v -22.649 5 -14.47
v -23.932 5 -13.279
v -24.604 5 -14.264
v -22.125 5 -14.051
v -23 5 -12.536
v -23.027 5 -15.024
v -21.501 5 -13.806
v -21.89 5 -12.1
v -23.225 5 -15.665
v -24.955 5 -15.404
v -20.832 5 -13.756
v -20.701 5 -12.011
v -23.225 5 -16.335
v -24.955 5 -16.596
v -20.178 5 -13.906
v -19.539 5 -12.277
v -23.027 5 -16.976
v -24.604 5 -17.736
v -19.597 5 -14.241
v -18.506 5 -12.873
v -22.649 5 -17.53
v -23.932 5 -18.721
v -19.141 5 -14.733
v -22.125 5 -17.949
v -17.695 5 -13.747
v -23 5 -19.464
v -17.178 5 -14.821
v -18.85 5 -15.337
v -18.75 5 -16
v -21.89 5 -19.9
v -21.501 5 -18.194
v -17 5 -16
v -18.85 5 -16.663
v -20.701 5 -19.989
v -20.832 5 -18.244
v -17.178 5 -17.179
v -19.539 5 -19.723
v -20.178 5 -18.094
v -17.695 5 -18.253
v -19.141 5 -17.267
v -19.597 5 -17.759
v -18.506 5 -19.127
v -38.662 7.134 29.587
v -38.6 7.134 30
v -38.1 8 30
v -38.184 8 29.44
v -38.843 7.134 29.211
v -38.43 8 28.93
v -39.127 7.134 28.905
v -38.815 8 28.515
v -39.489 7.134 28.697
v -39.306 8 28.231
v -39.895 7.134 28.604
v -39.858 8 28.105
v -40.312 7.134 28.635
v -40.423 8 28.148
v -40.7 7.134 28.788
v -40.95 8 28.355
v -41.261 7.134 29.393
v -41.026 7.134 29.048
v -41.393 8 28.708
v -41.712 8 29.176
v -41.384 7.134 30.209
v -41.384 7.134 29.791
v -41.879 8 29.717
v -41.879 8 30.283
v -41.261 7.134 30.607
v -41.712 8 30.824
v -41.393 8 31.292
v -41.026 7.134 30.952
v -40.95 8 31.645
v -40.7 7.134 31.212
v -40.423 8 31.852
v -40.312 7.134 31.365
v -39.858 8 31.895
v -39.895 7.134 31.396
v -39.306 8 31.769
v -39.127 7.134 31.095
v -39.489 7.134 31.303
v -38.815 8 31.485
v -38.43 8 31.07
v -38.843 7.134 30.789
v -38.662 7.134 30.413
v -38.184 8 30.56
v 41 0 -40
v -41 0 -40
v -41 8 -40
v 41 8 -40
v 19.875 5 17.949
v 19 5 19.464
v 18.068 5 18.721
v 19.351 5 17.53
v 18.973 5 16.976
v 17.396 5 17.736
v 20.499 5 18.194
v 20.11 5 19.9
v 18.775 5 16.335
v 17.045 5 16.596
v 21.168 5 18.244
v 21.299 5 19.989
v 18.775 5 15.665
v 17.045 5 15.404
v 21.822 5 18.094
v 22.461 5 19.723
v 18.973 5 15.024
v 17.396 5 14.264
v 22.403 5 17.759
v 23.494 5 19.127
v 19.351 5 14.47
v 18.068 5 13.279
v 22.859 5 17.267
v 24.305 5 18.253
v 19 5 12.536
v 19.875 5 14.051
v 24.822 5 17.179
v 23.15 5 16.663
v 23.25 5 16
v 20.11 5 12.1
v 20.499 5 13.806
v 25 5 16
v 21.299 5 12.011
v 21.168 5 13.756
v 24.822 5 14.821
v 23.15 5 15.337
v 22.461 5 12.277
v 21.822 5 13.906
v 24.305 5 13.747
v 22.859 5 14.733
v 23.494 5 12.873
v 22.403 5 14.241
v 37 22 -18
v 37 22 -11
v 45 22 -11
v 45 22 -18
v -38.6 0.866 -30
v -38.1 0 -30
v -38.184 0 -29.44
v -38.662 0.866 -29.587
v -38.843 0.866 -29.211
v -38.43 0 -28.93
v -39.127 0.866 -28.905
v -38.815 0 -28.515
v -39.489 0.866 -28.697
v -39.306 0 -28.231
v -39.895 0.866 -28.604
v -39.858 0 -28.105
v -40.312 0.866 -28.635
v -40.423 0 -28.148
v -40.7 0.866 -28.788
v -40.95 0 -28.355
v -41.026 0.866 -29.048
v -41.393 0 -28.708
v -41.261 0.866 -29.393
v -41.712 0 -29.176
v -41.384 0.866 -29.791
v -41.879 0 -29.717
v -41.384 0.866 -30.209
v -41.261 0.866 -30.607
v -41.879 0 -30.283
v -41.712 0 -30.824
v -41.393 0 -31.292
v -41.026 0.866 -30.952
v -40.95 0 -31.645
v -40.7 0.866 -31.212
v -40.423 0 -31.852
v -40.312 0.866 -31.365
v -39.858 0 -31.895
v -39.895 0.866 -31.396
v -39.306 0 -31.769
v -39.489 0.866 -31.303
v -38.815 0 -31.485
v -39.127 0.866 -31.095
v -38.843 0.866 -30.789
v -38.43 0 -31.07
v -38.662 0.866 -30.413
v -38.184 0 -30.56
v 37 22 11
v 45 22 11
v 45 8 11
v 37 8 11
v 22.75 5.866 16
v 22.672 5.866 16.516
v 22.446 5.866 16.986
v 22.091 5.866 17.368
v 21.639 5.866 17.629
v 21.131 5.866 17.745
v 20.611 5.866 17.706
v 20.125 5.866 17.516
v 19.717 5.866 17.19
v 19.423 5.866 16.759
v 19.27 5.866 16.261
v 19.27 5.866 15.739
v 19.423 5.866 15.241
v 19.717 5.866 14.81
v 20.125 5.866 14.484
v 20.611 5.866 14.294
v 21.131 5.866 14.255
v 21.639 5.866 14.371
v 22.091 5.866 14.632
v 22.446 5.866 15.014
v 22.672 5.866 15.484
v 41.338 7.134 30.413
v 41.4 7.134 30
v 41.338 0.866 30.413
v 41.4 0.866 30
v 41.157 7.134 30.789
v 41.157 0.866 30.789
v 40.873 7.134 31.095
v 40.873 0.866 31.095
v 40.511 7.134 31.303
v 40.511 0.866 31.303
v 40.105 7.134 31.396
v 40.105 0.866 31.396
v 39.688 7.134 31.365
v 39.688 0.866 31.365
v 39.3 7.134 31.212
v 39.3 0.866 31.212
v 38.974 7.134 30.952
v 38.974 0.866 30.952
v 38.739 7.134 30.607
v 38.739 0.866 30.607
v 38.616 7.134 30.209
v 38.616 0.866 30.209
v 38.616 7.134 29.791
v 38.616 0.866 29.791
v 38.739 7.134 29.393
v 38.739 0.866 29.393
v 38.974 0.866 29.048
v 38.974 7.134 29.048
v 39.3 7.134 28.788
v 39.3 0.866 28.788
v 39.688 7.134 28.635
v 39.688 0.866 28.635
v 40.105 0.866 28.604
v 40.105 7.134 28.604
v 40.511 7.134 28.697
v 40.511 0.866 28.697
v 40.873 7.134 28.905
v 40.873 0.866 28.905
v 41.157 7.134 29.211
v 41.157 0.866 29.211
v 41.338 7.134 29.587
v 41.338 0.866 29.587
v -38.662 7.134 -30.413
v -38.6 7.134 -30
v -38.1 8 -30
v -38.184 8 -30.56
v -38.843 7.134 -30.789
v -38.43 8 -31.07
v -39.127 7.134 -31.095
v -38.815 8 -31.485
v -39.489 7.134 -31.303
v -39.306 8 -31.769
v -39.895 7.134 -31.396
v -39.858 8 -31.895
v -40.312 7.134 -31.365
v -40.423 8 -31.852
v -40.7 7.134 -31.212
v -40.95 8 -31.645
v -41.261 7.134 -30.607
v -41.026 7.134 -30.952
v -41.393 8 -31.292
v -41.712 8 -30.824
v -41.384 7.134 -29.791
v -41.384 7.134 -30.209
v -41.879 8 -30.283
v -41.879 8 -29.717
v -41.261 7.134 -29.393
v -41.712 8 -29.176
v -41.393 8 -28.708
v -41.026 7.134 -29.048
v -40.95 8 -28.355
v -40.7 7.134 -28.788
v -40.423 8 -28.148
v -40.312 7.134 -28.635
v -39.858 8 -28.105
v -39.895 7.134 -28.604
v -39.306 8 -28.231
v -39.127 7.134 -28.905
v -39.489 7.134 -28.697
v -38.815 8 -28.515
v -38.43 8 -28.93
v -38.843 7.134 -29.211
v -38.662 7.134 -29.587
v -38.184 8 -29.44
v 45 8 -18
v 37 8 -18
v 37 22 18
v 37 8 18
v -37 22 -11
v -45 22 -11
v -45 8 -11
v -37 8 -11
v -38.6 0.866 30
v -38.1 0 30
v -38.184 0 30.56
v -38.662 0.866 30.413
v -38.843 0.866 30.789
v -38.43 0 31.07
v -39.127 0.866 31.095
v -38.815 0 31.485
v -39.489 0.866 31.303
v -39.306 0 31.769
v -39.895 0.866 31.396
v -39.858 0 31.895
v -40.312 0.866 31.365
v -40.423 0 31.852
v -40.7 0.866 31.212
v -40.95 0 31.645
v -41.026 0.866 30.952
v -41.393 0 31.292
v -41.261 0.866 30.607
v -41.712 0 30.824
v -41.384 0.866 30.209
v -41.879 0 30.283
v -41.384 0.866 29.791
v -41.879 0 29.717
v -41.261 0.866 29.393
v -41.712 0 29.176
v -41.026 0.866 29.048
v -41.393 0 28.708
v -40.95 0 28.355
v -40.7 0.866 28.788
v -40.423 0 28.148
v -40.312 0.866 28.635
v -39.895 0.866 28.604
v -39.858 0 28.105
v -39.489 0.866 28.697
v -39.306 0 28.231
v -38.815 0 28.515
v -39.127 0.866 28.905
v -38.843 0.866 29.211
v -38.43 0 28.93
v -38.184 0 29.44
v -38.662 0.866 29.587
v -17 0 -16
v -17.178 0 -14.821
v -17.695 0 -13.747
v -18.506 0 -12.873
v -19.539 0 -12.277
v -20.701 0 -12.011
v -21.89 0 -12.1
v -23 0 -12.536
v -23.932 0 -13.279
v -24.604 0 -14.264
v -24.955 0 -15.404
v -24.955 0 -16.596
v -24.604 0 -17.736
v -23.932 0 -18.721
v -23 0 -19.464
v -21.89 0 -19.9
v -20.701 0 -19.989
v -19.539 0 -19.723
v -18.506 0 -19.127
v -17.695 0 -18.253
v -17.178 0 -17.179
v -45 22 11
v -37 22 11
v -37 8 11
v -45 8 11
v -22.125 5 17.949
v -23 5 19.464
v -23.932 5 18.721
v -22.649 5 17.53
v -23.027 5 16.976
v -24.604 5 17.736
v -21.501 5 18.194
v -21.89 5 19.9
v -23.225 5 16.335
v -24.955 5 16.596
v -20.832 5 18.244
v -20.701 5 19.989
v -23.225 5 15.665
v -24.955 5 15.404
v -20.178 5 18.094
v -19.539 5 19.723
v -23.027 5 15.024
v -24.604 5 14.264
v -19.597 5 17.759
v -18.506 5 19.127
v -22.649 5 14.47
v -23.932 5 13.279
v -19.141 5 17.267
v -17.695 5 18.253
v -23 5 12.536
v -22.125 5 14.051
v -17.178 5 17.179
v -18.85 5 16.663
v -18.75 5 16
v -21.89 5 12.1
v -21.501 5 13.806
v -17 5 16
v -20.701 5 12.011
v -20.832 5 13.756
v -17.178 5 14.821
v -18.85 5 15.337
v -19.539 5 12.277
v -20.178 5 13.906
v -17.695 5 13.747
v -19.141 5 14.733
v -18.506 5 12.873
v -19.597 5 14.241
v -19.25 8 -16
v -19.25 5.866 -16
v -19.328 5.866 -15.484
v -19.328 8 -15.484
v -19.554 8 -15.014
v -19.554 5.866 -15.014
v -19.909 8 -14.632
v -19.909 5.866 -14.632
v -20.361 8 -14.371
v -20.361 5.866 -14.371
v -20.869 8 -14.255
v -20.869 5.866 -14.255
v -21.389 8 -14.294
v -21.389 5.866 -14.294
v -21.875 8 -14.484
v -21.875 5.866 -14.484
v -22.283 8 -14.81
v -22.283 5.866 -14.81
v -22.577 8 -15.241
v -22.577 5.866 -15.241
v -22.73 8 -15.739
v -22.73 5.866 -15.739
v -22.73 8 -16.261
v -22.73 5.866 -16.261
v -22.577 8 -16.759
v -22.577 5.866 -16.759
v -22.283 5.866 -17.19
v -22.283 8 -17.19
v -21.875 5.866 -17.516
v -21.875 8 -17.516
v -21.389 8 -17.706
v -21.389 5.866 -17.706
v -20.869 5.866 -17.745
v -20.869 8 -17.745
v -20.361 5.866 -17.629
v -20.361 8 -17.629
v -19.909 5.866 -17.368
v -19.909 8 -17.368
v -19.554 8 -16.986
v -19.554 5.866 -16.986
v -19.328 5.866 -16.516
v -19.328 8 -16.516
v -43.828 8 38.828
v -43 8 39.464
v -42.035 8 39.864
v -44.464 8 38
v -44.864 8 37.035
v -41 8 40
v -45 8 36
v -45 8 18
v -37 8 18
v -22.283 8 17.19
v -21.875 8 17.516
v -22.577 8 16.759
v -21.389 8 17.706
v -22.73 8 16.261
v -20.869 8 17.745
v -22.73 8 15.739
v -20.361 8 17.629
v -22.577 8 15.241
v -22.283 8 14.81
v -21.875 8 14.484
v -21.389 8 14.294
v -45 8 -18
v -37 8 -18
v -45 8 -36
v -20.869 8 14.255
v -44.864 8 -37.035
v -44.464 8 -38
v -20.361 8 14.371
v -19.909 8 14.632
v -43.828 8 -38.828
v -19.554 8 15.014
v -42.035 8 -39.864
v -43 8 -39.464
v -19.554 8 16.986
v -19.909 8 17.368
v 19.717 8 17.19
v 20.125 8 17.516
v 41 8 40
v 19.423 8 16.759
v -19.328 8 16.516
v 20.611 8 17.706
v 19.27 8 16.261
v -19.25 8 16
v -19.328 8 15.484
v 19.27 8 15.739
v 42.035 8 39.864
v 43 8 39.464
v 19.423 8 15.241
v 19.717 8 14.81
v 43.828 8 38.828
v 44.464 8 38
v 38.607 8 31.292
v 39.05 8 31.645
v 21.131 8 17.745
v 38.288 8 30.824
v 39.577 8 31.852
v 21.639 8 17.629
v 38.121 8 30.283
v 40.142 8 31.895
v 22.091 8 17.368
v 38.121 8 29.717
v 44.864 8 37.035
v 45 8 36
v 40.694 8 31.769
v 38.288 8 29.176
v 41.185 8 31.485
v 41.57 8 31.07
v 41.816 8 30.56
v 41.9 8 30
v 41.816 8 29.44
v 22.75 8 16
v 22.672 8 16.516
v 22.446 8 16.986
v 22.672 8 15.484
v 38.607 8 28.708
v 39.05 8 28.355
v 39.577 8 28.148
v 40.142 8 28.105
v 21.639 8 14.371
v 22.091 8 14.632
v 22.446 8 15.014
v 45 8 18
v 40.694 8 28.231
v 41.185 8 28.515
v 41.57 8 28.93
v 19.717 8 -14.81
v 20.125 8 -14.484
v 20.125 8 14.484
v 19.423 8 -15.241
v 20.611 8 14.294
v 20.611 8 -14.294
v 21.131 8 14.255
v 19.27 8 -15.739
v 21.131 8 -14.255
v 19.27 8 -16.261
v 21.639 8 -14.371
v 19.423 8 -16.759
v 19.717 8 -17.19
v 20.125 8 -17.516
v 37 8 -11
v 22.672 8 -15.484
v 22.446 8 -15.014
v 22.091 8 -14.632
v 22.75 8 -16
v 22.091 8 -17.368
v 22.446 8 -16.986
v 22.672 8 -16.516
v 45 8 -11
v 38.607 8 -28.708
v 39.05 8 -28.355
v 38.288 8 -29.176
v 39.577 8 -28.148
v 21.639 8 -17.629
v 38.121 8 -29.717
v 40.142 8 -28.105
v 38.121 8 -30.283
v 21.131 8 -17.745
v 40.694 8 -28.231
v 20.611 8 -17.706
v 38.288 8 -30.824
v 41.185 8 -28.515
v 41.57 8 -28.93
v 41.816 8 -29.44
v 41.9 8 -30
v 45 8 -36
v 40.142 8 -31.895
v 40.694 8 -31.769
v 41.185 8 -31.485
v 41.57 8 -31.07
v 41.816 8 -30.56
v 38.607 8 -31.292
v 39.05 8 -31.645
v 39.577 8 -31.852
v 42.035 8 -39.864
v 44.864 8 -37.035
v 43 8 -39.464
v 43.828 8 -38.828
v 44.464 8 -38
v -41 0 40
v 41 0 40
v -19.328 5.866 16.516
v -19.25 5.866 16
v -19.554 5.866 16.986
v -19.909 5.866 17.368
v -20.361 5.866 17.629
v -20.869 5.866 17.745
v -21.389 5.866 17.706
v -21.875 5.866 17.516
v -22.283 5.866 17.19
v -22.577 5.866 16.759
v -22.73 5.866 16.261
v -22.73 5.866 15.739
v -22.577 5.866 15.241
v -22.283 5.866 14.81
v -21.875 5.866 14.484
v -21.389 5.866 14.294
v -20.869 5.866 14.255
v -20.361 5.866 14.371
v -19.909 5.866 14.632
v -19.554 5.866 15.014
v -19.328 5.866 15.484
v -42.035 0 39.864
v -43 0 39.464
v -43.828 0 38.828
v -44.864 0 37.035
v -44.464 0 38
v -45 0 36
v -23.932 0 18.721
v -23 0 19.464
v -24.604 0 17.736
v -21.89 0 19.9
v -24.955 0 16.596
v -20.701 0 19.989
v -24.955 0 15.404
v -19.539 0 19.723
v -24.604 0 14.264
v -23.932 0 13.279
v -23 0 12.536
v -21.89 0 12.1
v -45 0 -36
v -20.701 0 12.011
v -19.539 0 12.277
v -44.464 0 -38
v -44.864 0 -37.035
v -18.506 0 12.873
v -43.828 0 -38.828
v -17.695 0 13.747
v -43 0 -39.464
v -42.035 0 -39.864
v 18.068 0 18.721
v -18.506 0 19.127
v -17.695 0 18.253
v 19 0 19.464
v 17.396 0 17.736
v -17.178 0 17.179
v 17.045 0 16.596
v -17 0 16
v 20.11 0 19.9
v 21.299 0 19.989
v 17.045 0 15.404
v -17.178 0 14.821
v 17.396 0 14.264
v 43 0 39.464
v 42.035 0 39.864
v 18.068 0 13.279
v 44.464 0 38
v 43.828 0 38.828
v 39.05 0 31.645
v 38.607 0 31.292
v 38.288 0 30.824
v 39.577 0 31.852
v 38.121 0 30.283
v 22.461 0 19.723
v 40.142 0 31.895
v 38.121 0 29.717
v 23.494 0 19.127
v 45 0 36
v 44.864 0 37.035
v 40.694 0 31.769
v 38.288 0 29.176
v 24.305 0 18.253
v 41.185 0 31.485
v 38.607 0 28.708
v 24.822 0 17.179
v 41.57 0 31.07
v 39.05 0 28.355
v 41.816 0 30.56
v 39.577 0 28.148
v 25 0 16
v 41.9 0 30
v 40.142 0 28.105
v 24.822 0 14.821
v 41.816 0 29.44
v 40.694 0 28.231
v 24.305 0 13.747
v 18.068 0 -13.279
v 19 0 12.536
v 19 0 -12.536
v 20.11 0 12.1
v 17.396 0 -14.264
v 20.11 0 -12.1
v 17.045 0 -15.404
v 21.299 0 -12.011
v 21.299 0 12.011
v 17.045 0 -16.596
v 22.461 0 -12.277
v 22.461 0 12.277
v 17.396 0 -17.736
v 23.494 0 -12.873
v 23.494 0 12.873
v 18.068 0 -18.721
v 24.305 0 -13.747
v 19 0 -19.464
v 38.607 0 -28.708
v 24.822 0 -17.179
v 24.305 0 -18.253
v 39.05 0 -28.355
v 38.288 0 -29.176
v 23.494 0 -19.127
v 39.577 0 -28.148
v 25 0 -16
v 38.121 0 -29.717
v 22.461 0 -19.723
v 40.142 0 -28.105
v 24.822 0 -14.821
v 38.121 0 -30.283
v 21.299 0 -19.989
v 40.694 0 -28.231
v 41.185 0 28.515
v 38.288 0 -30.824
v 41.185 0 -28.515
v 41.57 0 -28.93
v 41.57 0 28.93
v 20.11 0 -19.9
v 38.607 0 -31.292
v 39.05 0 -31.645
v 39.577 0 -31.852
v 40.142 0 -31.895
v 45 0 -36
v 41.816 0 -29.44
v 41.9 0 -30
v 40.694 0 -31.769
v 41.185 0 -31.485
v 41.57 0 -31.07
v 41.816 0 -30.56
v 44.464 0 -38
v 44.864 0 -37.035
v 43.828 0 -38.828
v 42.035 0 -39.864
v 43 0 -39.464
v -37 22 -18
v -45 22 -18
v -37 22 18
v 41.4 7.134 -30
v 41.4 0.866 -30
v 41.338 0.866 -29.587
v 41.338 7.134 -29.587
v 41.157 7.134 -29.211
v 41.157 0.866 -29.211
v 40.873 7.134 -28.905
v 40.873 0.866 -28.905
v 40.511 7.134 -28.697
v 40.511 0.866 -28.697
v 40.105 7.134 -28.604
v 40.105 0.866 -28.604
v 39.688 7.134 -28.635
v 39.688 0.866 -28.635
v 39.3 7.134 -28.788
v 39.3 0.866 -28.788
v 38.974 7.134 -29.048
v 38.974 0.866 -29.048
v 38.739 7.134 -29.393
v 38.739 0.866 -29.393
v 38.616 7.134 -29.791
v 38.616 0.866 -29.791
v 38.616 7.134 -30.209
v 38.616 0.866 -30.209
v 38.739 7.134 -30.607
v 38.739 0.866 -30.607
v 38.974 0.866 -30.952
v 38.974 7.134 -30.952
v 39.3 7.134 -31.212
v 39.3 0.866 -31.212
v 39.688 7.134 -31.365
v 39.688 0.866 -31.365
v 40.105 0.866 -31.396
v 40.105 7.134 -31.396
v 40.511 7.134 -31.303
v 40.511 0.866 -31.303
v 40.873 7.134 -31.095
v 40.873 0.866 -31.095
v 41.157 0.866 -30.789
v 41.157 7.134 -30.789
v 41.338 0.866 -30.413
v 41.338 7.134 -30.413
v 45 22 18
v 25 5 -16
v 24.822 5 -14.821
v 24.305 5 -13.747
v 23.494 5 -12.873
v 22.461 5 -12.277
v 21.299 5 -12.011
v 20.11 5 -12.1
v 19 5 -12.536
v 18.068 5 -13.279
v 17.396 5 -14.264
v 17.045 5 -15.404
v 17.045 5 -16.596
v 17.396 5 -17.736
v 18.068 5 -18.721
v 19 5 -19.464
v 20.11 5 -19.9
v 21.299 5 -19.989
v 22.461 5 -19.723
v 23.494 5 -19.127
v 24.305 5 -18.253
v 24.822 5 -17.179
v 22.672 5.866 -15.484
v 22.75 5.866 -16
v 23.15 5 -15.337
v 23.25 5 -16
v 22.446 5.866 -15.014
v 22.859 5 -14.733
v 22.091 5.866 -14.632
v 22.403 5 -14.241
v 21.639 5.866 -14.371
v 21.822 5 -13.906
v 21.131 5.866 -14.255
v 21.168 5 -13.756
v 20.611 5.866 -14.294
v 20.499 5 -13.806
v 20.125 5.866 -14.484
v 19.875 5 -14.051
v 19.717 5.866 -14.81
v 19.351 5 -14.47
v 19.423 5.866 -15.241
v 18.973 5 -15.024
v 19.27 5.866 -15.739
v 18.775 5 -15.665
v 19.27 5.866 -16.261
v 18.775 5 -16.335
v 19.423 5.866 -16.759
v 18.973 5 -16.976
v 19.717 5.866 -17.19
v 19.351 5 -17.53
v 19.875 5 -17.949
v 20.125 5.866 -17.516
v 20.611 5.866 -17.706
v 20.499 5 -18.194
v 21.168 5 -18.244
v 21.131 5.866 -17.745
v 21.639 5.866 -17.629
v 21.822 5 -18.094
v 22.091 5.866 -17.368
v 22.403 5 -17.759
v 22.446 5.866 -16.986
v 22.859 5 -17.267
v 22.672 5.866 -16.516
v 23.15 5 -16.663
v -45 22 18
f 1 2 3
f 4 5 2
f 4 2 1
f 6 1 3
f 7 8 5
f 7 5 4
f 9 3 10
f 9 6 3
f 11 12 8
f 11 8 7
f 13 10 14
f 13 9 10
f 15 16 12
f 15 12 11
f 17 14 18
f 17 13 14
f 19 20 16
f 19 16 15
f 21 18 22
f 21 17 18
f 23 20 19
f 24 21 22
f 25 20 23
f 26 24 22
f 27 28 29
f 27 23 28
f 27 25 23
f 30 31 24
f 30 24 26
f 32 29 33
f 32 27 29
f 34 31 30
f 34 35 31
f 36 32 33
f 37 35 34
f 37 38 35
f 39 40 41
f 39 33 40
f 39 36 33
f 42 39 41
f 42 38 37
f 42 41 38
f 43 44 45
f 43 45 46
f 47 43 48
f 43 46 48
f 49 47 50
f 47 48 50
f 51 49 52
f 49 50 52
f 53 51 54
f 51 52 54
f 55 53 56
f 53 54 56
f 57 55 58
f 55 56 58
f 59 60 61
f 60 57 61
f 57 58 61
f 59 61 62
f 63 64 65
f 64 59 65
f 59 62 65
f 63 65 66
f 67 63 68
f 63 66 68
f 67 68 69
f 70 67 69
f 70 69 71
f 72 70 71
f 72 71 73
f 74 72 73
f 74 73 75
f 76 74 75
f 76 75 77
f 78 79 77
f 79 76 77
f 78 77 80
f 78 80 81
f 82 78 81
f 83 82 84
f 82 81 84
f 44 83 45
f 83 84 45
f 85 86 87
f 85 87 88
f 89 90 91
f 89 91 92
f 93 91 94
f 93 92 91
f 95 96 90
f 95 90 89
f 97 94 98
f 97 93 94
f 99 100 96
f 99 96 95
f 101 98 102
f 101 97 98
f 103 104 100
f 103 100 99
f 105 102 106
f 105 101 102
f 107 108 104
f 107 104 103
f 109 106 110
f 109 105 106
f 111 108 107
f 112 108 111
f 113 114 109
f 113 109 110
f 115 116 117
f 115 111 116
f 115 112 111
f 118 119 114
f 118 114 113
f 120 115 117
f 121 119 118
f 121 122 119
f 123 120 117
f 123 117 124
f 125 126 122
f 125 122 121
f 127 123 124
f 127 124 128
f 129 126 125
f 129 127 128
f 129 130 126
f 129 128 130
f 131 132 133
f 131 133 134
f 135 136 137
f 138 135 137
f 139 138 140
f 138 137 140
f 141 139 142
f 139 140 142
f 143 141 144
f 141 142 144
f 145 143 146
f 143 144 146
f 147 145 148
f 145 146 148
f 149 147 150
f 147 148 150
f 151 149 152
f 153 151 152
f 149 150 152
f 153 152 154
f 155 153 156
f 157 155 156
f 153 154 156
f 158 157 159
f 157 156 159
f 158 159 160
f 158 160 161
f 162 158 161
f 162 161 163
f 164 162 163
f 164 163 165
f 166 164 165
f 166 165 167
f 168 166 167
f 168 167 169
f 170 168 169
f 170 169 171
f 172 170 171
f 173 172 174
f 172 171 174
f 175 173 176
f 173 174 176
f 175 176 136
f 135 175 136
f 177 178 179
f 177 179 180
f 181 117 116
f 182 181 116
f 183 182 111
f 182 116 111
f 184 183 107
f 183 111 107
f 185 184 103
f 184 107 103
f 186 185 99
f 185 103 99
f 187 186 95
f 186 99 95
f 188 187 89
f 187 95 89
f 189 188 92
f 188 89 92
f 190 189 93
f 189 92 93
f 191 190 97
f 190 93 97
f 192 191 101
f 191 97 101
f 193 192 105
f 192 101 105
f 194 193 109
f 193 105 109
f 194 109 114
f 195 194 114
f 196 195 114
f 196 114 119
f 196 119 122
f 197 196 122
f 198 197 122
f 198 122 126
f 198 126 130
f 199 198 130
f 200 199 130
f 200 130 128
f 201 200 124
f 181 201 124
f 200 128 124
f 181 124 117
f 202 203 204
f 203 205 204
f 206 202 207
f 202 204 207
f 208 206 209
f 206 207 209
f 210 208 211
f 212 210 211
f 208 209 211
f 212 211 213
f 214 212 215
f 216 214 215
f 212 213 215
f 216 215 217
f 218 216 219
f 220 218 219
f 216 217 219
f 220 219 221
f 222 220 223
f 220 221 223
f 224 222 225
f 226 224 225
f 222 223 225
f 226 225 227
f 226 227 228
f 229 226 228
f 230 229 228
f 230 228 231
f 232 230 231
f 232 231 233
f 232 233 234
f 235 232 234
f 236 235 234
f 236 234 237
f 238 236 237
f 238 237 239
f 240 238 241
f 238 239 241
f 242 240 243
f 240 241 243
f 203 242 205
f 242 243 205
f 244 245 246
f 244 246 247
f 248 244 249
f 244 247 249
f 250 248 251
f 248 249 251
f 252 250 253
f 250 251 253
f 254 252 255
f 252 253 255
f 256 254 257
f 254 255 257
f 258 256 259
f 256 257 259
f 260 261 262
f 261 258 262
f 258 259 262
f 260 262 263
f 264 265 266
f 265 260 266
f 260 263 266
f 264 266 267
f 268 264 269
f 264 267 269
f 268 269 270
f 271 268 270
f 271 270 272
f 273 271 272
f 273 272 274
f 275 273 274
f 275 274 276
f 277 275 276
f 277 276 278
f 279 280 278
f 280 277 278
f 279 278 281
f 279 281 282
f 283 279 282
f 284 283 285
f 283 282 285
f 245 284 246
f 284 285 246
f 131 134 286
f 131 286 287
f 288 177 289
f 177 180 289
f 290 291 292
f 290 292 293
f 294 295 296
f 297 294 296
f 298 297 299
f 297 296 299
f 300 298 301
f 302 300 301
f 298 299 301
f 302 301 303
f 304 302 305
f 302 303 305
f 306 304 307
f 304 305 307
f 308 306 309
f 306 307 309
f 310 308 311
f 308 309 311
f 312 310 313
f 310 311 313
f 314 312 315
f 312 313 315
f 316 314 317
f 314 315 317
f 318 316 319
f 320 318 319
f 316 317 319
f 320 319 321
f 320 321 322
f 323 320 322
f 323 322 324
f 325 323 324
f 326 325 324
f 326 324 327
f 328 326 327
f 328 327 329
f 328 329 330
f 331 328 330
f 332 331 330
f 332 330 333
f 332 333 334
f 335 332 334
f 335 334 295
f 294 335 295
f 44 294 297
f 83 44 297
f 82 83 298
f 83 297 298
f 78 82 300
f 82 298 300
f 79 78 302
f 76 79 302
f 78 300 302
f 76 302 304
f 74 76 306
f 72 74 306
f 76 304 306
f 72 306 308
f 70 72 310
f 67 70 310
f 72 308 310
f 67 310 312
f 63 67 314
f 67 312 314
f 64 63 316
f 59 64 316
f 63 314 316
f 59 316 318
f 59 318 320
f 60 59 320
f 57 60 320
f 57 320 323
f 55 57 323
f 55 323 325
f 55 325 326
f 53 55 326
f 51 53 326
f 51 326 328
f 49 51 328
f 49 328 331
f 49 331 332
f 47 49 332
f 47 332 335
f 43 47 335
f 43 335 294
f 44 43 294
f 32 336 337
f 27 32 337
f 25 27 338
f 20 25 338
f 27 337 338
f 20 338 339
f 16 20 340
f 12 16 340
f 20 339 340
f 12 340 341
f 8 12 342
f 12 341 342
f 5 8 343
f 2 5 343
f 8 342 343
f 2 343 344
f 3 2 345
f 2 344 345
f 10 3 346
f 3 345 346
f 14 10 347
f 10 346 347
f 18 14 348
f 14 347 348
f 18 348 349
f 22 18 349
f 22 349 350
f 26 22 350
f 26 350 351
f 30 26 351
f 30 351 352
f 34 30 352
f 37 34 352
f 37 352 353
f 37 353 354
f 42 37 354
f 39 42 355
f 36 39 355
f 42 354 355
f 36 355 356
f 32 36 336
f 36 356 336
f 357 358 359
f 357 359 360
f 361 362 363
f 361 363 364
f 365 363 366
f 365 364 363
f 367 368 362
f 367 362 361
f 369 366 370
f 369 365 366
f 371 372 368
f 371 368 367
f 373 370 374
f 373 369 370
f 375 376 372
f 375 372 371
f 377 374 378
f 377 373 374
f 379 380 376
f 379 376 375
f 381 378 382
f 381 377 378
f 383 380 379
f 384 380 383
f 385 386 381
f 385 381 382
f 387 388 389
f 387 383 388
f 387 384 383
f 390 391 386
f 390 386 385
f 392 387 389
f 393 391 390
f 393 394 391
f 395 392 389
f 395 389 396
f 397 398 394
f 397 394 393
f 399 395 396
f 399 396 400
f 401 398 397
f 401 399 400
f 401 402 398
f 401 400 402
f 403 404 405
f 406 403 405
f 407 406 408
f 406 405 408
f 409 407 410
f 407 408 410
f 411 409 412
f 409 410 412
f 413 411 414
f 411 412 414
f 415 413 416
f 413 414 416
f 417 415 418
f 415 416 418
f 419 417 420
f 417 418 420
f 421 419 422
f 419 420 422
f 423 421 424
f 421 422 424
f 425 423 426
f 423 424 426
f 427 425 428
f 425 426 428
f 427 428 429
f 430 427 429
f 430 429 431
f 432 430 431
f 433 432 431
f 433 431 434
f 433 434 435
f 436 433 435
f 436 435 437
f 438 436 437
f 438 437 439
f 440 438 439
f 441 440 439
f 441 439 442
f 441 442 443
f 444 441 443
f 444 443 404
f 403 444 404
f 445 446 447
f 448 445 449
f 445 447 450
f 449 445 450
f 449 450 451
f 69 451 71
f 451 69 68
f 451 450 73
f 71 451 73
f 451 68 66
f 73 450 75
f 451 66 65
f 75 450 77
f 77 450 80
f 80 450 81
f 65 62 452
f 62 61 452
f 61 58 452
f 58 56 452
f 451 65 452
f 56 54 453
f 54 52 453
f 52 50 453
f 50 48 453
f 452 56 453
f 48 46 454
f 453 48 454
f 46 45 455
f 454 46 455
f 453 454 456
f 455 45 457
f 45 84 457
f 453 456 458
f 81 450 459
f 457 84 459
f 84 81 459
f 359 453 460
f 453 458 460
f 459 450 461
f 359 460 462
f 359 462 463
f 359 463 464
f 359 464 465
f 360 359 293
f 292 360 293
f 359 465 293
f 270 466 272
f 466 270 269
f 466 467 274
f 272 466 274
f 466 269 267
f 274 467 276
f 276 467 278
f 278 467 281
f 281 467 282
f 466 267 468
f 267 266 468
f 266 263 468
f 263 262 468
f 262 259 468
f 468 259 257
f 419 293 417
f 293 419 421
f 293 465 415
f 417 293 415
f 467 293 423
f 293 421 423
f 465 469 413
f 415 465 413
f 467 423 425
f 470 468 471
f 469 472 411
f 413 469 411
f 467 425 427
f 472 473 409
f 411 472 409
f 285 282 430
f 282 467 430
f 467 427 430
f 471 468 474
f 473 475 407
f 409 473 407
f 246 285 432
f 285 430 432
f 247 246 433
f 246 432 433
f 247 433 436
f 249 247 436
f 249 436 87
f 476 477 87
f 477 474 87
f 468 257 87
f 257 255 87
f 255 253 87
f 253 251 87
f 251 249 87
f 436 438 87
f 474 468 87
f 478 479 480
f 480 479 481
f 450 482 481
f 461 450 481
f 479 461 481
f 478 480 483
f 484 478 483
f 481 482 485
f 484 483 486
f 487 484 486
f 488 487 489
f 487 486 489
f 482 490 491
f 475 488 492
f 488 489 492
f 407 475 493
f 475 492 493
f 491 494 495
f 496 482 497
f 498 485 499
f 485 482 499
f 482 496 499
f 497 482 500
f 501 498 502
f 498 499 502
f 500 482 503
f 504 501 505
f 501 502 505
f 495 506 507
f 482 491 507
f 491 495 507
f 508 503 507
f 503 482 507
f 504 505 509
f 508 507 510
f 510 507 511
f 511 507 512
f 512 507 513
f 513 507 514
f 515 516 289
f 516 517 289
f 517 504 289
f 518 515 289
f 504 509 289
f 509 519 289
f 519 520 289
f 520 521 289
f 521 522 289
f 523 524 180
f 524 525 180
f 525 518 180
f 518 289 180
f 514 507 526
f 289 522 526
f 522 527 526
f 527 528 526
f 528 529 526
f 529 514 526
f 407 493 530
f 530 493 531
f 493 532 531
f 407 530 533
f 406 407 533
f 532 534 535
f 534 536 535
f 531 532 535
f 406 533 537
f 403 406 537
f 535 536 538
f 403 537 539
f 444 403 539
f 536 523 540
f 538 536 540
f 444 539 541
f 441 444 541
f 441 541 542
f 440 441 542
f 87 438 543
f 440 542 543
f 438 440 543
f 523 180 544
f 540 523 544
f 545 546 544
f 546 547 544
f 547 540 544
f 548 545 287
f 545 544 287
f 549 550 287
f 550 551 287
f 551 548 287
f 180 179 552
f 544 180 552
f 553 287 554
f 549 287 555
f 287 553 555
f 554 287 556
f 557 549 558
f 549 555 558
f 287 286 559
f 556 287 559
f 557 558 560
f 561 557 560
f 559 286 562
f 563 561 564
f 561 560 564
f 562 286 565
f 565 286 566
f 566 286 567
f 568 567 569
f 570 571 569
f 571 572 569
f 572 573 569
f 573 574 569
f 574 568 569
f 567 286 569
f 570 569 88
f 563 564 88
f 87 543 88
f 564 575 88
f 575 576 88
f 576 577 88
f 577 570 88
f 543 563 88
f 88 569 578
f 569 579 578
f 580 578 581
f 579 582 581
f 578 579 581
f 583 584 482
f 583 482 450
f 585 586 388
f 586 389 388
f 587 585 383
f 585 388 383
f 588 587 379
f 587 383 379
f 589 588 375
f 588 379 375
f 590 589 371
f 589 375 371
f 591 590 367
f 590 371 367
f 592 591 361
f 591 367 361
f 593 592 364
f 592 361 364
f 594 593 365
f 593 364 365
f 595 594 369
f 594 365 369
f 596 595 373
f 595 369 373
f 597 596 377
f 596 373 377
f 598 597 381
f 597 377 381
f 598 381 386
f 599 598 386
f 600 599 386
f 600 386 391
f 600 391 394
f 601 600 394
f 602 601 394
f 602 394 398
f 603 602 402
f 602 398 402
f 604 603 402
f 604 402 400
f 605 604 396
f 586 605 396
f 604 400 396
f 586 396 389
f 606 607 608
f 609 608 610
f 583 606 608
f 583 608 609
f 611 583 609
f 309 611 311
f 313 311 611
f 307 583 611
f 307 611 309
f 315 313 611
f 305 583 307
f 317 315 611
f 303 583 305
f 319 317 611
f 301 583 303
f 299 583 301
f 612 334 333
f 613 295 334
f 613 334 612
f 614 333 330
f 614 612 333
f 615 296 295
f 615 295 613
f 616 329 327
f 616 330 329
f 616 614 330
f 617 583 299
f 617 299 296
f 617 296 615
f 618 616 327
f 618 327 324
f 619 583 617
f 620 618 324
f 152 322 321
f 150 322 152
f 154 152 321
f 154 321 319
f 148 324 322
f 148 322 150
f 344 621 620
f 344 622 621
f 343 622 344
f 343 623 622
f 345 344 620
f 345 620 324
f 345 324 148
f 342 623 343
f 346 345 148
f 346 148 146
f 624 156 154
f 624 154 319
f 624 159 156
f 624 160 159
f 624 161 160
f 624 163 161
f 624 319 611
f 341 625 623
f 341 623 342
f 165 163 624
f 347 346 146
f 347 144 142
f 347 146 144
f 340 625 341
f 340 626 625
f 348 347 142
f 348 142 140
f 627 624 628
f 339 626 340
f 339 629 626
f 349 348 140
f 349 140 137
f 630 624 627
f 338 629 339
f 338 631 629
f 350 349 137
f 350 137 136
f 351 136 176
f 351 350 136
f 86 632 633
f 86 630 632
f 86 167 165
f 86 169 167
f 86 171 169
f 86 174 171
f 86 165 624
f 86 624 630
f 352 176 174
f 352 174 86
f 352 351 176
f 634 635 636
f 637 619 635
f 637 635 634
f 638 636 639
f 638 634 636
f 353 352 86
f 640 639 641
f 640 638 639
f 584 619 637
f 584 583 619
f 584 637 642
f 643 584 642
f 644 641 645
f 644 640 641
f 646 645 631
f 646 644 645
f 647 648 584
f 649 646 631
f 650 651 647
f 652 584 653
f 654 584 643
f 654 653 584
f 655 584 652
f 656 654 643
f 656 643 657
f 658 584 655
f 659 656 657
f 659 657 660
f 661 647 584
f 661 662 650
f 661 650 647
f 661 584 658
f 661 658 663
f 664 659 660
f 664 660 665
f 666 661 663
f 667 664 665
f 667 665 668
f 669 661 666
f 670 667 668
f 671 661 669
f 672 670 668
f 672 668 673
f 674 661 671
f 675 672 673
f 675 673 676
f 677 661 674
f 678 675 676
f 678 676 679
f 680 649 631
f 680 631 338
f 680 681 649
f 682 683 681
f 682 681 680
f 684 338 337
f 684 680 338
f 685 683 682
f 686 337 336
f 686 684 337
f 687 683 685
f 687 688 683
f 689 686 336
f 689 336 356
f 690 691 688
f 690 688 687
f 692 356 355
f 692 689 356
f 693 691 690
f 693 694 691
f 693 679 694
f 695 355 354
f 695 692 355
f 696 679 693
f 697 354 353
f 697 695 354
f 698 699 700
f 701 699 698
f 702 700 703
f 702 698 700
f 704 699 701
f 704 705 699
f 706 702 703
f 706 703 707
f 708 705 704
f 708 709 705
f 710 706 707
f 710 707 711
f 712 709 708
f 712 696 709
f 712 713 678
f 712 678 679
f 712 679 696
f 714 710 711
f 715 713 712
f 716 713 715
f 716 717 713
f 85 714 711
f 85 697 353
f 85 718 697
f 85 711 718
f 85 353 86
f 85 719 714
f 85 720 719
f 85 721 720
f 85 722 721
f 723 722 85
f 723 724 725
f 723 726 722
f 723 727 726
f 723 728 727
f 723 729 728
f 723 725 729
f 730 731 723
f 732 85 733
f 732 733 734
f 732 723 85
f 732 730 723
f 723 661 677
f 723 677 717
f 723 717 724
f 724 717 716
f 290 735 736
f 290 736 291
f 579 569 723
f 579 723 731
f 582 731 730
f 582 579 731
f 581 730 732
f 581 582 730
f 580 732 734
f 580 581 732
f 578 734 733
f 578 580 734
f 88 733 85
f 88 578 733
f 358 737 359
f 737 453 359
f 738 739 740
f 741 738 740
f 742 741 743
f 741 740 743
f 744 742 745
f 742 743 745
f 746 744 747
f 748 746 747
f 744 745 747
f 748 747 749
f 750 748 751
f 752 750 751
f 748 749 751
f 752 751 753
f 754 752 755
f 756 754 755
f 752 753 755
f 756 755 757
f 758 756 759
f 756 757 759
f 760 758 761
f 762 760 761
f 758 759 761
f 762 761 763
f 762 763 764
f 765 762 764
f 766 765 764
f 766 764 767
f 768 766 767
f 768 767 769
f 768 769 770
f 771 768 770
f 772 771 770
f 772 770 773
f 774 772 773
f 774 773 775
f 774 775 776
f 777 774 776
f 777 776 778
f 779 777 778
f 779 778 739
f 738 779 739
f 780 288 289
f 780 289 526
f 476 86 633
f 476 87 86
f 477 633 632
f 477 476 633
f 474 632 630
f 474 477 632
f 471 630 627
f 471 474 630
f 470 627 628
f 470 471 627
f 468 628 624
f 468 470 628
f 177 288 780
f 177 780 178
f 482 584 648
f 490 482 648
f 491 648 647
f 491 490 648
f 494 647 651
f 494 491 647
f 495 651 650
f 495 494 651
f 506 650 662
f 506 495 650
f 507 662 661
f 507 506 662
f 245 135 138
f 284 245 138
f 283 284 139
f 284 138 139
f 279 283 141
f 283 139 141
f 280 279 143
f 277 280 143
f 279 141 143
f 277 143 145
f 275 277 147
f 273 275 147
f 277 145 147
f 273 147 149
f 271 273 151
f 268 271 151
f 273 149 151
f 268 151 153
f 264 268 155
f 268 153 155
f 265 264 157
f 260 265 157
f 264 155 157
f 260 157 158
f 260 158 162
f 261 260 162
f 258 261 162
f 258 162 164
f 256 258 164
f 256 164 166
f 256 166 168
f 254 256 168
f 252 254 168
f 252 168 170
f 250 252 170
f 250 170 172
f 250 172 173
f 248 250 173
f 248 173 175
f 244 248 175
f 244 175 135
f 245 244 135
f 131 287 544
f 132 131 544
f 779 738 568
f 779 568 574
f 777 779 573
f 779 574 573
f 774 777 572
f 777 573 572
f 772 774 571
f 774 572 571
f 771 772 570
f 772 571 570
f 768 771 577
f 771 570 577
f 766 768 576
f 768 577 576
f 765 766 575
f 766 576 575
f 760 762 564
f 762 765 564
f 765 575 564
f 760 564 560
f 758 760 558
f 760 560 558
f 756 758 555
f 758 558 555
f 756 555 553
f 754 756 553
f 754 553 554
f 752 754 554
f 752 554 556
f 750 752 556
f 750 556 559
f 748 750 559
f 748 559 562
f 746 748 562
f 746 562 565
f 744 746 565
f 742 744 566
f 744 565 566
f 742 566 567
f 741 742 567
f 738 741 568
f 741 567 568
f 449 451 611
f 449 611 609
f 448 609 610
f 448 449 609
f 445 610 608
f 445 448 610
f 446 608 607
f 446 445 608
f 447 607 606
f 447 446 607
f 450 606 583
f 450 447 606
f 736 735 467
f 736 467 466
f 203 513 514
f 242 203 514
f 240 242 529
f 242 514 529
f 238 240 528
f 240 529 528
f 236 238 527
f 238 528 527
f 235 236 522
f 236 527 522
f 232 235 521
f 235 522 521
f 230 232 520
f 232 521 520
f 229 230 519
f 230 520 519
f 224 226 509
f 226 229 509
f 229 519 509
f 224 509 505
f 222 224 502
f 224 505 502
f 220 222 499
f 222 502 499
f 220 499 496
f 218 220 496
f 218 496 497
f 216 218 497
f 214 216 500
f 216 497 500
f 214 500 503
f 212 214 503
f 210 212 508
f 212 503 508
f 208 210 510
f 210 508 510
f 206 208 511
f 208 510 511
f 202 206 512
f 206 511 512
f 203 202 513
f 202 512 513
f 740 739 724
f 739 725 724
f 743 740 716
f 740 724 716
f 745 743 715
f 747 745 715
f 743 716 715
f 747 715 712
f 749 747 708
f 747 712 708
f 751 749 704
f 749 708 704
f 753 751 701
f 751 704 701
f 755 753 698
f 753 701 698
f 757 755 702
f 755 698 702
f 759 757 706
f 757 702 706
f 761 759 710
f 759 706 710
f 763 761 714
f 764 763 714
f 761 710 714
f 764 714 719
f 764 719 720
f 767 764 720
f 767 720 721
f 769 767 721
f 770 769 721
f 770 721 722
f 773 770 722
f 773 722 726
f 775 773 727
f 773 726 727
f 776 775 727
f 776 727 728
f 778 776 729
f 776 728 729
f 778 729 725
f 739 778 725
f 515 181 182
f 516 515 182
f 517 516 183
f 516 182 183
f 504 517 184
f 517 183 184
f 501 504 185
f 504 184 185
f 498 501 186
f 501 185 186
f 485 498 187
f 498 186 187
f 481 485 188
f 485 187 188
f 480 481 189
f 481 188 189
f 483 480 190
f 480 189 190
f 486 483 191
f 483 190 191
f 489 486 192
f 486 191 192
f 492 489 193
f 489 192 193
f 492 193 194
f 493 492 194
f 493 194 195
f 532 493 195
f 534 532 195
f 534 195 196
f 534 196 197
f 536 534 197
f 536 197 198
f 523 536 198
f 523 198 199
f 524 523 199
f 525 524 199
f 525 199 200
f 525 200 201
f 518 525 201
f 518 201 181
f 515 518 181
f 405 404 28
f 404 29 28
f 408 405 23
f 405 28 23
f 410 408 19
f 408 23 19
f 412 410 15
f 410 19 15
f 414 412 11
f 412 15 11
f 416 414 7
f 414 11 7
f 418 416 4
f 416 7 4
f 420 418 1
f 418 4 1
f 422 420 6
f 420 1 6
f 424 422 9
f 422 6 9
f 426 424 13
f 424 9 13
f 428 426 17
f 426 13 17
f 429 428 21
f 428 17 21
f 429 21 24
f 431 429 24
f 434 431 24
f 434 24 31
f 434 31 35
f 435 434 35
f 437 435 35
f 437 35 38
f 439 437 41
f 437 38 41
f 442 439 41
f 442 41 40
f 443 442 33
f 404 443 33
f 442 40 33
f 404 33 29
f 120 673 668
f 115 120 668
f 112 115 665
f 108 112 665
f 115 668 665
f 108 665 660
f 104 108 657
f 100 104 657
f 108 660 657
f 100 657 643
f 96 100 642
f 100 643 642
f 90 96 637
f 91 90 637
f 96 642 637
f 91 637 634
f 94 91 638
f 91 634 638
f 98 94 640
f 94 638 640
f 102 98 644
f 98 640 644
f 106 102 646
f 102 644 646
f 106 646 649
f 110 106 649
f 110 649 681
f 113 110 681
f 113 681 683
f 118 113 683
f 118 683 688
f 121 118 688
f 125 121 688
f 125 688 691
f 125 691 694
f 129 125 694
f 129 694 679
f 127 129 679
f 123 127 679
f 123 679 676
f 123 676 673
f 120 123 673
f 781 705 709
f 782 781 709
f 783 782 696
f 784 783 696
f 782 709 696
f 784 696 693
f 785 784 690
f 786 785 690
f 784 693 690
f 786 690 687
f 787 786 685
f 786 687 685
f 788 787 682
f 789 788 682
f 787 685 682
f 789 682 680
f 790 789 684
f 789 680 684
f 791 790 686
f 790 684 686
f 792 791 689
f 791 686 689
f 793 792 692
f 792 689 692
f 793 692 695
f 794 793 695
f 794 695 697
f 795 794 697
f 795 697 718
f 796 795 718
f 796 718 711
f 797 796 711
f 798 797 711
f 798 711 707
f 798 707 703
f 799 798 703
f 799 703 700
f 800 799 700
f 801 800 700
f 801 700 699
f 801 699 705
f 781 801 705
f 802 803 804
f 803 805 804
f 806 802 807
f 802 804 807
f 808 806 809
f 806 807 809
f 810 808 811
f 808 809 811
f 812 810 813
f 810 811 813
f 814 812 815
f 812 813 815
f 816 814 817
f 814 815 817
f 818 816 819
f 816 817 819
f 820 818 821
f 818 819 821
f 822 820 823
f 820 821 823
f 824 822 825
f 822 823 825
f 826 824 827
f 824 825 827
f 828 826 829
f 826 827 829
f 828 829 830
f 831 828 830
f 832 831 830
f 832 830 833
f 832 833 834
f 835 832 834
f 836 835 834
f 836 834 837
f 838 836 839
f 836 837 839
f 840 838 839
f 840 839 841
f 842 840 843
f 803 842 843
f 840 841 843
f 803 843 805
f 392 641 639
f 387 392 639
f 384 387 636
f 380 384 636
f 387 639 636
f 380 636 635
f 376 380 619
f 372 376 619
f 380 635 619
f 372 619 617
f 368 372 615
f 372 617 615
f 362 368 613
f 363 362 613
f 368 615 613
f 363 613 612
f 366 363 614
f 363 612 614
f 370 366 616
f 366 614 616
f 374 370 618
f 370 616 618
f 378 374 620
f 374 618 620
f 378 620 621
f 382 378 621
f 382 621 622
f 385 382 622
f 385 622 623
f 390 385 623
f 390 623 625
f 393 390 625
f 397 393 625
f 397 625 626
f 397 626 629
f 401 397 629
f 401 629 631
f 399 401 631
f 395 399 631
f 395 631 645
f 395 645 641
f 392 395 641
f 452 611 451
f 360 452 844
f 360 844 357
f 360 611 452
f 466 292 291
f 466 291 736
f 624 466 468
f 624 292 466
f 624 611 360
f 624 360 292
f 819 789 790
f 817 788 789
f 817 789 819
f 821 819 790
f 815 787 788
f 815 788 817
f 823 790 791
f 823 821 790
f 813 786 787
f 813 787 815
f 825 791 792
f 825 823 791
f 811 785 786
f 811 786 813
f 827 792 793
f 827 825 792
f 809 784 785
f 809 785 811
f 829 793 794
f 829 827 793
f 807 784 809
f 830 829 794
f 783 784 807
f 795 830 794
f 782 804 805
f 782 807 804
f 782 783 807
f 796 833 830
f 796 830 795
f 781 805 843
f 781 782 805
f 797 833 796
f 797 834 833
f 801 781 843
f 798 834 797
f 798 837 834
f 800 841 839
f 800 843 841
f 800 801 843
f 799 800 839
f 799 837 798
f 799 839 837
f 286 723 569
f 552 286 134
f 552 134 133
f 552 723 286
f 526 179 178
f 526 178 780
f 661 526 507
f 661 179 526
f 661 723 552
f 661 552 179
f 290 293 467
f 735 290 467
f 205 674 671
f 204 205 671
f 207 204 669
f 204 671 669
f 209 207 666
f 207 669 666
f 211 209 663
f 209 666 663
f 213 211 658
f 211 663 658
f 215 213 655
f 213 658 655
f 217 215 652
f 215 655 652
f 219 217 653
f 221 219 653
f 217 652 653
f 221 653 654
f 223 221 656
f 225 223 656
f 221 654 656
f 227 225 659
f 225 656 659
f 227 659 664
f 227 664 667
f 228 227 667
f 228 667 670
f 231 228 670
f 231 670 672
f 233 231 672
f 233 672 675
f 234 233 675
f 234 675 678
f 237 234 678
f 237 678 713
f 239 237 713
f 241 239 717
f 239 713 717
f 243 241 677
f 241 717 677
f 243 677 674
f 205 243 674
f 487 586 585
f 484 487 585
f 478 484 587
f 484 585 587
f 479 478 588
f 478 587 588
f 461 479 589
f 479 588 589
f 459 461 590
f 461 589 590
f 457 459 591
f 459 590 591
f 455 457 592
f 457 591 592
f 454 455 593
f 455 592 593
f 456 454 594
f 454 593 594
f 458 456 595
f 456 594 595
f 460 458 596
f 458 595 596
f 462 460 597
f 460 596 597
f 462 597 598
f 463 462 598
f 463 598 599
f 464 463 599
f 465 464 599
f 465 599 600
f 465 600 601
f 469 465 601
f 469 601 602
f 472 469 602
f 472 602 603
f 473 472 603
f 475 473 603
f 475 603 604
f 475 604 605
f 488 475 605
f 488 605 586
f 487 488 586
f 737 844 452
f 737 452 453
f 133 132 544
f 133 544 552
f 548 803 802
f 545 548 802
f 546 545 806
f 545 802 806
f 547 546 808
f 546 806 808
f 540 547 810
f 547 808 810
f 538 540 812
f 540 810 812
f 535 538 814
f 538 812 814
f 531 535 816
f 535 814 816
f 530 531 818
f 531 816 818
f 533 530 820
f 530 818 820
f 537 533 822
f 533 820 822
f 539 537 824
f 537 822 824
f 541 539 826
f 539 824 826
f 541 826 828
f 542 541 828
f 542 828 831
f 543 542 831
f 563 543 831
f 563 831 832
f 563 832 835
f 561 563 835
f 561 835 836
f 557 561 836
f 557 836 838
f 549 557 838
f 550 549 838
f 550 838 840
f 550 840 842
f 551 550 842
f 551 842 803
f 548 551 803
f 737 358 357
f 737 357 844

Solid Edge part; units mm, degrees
sketch "Sketch1" plane through (0, 0, 0) normal (0, -1, 0) x (1, 0, 0)
  line L0 (-45, -40) -> (45, -40)
  line L1 (45, -40) -> (45, 40)
  line L2 (45, 40) -> (-45, 40)
  line L3 (-45, 40) -> (-45, -40)
  dimension "D1" = 90
  dimension "D2" = 80
extrude "Protrusion1" add sketch "Sketch1" against normal blind 8
sketch "Sketch2" plane through (0, 0, 0) normal (0, -1, 0) x (1, 0, 0)
  circle A0 centre (-40, 30) radius 1.4
  circle A1 centre (-40, -30) radius 1.4
  circle A2 centre (40, -30) radius 1.4
  circle A3 centre (40, 30) radius 1.4
  dimension "D1" = 2.8
  dimension "D2" = 60
  dimension "D3" = 80
extrude "Cutout1" cut sketch "Sketch2" against normal through all
sketch "Sketch3" plane through (0, 0, 0) normal (0, -1, 0) x (1, 0, 0)
  circle A0 centre (-21, 16) radius 4
  circle A1 centre (-21, -16) radius 4
  circle A2 centre (21, -16) radius 4
  circle A3 centre (21, 16) radius 4
extrude "Extrusionsausschnitt_2" cut sketch "Sketch3" against normal blind 5
sketch "Sketch4" plane through (0, 0, 0) normal (0, -1, 0) x (1, 0, 0)
  circle A0 centre (-21, 16) radius 1.75
  circle A1 centre (-21, -16) radius 1.75
  circle A2 centre (21, -16) radius 1.75
  circle A3 centre (21, 16) radius 1.75
  dimension "D1" = 3.5
extrude "Cutout2" cut sketch "Sketch4" against normal through all
fillet "Verrundung_1" radius 4 4 edges at (-45, 4, 40) (45, 4, 40) (45, 4, -40) (-45, 4, -40)
chamfer "Fase_1" distance 0.5 angle 60 4 edges at (38.6, 0, 30) (-41.4, 0, 30) (-41.4, 0, -30) (38.6, 0, -30) measured on face at (-29.1, 0, 27.4667)
chamfer "Fase_2" distance 0.5 angle 60 4 edges at (-40, 8, 31.4) (40, 8, 31.4) (40, 8, -28.6) (-40, 8, -28.6) measured on face at (-29.1, 8, 27.4667)
chamfer "Fase_4" distance 0.5 angle 60 4 edges at (-21, 5, 14.25) (-21, 5, -17.75) (21, 5, 14.25) (21, 5, -17.75) measured on face at (-23.5867, 5, 18.7467) measured on face at (-23.5867, 5, -13.2533) measured on face at (18.4133, 5, 18.7467) measured on face at (18.4133, 5, -13.2533)
sketch "Sketch5" plane through (0, 8, 0) normal (0, 1, 0) x (1, 0, 0)
  line L0 (-45, 11) -> (-37, 11)
  line L1 (-37, 11) -> (-37, 18)
  line L2 (-37, 18) -> (-45, 18)
  line L3 (-45, 18) -> (-45, 11)
  dimension "D1" = 11
  dimension "D2" = 8
  dimension "D3" = 18
extrude "Extrusionsausprägung_2" add sketch "Sketch5" along normal blind 14
mirror "Mirror1" about plane through (0, 0, 0) normal (0, 0, 1) of "Extrusionsausprägung_2"
mirror "Mirror2" about plane through (0, 0, 0) normal (1, 0, 0) of "Extrusionsausprägung_2", "Mirror1"
properties material "Nylon, allgemein"
